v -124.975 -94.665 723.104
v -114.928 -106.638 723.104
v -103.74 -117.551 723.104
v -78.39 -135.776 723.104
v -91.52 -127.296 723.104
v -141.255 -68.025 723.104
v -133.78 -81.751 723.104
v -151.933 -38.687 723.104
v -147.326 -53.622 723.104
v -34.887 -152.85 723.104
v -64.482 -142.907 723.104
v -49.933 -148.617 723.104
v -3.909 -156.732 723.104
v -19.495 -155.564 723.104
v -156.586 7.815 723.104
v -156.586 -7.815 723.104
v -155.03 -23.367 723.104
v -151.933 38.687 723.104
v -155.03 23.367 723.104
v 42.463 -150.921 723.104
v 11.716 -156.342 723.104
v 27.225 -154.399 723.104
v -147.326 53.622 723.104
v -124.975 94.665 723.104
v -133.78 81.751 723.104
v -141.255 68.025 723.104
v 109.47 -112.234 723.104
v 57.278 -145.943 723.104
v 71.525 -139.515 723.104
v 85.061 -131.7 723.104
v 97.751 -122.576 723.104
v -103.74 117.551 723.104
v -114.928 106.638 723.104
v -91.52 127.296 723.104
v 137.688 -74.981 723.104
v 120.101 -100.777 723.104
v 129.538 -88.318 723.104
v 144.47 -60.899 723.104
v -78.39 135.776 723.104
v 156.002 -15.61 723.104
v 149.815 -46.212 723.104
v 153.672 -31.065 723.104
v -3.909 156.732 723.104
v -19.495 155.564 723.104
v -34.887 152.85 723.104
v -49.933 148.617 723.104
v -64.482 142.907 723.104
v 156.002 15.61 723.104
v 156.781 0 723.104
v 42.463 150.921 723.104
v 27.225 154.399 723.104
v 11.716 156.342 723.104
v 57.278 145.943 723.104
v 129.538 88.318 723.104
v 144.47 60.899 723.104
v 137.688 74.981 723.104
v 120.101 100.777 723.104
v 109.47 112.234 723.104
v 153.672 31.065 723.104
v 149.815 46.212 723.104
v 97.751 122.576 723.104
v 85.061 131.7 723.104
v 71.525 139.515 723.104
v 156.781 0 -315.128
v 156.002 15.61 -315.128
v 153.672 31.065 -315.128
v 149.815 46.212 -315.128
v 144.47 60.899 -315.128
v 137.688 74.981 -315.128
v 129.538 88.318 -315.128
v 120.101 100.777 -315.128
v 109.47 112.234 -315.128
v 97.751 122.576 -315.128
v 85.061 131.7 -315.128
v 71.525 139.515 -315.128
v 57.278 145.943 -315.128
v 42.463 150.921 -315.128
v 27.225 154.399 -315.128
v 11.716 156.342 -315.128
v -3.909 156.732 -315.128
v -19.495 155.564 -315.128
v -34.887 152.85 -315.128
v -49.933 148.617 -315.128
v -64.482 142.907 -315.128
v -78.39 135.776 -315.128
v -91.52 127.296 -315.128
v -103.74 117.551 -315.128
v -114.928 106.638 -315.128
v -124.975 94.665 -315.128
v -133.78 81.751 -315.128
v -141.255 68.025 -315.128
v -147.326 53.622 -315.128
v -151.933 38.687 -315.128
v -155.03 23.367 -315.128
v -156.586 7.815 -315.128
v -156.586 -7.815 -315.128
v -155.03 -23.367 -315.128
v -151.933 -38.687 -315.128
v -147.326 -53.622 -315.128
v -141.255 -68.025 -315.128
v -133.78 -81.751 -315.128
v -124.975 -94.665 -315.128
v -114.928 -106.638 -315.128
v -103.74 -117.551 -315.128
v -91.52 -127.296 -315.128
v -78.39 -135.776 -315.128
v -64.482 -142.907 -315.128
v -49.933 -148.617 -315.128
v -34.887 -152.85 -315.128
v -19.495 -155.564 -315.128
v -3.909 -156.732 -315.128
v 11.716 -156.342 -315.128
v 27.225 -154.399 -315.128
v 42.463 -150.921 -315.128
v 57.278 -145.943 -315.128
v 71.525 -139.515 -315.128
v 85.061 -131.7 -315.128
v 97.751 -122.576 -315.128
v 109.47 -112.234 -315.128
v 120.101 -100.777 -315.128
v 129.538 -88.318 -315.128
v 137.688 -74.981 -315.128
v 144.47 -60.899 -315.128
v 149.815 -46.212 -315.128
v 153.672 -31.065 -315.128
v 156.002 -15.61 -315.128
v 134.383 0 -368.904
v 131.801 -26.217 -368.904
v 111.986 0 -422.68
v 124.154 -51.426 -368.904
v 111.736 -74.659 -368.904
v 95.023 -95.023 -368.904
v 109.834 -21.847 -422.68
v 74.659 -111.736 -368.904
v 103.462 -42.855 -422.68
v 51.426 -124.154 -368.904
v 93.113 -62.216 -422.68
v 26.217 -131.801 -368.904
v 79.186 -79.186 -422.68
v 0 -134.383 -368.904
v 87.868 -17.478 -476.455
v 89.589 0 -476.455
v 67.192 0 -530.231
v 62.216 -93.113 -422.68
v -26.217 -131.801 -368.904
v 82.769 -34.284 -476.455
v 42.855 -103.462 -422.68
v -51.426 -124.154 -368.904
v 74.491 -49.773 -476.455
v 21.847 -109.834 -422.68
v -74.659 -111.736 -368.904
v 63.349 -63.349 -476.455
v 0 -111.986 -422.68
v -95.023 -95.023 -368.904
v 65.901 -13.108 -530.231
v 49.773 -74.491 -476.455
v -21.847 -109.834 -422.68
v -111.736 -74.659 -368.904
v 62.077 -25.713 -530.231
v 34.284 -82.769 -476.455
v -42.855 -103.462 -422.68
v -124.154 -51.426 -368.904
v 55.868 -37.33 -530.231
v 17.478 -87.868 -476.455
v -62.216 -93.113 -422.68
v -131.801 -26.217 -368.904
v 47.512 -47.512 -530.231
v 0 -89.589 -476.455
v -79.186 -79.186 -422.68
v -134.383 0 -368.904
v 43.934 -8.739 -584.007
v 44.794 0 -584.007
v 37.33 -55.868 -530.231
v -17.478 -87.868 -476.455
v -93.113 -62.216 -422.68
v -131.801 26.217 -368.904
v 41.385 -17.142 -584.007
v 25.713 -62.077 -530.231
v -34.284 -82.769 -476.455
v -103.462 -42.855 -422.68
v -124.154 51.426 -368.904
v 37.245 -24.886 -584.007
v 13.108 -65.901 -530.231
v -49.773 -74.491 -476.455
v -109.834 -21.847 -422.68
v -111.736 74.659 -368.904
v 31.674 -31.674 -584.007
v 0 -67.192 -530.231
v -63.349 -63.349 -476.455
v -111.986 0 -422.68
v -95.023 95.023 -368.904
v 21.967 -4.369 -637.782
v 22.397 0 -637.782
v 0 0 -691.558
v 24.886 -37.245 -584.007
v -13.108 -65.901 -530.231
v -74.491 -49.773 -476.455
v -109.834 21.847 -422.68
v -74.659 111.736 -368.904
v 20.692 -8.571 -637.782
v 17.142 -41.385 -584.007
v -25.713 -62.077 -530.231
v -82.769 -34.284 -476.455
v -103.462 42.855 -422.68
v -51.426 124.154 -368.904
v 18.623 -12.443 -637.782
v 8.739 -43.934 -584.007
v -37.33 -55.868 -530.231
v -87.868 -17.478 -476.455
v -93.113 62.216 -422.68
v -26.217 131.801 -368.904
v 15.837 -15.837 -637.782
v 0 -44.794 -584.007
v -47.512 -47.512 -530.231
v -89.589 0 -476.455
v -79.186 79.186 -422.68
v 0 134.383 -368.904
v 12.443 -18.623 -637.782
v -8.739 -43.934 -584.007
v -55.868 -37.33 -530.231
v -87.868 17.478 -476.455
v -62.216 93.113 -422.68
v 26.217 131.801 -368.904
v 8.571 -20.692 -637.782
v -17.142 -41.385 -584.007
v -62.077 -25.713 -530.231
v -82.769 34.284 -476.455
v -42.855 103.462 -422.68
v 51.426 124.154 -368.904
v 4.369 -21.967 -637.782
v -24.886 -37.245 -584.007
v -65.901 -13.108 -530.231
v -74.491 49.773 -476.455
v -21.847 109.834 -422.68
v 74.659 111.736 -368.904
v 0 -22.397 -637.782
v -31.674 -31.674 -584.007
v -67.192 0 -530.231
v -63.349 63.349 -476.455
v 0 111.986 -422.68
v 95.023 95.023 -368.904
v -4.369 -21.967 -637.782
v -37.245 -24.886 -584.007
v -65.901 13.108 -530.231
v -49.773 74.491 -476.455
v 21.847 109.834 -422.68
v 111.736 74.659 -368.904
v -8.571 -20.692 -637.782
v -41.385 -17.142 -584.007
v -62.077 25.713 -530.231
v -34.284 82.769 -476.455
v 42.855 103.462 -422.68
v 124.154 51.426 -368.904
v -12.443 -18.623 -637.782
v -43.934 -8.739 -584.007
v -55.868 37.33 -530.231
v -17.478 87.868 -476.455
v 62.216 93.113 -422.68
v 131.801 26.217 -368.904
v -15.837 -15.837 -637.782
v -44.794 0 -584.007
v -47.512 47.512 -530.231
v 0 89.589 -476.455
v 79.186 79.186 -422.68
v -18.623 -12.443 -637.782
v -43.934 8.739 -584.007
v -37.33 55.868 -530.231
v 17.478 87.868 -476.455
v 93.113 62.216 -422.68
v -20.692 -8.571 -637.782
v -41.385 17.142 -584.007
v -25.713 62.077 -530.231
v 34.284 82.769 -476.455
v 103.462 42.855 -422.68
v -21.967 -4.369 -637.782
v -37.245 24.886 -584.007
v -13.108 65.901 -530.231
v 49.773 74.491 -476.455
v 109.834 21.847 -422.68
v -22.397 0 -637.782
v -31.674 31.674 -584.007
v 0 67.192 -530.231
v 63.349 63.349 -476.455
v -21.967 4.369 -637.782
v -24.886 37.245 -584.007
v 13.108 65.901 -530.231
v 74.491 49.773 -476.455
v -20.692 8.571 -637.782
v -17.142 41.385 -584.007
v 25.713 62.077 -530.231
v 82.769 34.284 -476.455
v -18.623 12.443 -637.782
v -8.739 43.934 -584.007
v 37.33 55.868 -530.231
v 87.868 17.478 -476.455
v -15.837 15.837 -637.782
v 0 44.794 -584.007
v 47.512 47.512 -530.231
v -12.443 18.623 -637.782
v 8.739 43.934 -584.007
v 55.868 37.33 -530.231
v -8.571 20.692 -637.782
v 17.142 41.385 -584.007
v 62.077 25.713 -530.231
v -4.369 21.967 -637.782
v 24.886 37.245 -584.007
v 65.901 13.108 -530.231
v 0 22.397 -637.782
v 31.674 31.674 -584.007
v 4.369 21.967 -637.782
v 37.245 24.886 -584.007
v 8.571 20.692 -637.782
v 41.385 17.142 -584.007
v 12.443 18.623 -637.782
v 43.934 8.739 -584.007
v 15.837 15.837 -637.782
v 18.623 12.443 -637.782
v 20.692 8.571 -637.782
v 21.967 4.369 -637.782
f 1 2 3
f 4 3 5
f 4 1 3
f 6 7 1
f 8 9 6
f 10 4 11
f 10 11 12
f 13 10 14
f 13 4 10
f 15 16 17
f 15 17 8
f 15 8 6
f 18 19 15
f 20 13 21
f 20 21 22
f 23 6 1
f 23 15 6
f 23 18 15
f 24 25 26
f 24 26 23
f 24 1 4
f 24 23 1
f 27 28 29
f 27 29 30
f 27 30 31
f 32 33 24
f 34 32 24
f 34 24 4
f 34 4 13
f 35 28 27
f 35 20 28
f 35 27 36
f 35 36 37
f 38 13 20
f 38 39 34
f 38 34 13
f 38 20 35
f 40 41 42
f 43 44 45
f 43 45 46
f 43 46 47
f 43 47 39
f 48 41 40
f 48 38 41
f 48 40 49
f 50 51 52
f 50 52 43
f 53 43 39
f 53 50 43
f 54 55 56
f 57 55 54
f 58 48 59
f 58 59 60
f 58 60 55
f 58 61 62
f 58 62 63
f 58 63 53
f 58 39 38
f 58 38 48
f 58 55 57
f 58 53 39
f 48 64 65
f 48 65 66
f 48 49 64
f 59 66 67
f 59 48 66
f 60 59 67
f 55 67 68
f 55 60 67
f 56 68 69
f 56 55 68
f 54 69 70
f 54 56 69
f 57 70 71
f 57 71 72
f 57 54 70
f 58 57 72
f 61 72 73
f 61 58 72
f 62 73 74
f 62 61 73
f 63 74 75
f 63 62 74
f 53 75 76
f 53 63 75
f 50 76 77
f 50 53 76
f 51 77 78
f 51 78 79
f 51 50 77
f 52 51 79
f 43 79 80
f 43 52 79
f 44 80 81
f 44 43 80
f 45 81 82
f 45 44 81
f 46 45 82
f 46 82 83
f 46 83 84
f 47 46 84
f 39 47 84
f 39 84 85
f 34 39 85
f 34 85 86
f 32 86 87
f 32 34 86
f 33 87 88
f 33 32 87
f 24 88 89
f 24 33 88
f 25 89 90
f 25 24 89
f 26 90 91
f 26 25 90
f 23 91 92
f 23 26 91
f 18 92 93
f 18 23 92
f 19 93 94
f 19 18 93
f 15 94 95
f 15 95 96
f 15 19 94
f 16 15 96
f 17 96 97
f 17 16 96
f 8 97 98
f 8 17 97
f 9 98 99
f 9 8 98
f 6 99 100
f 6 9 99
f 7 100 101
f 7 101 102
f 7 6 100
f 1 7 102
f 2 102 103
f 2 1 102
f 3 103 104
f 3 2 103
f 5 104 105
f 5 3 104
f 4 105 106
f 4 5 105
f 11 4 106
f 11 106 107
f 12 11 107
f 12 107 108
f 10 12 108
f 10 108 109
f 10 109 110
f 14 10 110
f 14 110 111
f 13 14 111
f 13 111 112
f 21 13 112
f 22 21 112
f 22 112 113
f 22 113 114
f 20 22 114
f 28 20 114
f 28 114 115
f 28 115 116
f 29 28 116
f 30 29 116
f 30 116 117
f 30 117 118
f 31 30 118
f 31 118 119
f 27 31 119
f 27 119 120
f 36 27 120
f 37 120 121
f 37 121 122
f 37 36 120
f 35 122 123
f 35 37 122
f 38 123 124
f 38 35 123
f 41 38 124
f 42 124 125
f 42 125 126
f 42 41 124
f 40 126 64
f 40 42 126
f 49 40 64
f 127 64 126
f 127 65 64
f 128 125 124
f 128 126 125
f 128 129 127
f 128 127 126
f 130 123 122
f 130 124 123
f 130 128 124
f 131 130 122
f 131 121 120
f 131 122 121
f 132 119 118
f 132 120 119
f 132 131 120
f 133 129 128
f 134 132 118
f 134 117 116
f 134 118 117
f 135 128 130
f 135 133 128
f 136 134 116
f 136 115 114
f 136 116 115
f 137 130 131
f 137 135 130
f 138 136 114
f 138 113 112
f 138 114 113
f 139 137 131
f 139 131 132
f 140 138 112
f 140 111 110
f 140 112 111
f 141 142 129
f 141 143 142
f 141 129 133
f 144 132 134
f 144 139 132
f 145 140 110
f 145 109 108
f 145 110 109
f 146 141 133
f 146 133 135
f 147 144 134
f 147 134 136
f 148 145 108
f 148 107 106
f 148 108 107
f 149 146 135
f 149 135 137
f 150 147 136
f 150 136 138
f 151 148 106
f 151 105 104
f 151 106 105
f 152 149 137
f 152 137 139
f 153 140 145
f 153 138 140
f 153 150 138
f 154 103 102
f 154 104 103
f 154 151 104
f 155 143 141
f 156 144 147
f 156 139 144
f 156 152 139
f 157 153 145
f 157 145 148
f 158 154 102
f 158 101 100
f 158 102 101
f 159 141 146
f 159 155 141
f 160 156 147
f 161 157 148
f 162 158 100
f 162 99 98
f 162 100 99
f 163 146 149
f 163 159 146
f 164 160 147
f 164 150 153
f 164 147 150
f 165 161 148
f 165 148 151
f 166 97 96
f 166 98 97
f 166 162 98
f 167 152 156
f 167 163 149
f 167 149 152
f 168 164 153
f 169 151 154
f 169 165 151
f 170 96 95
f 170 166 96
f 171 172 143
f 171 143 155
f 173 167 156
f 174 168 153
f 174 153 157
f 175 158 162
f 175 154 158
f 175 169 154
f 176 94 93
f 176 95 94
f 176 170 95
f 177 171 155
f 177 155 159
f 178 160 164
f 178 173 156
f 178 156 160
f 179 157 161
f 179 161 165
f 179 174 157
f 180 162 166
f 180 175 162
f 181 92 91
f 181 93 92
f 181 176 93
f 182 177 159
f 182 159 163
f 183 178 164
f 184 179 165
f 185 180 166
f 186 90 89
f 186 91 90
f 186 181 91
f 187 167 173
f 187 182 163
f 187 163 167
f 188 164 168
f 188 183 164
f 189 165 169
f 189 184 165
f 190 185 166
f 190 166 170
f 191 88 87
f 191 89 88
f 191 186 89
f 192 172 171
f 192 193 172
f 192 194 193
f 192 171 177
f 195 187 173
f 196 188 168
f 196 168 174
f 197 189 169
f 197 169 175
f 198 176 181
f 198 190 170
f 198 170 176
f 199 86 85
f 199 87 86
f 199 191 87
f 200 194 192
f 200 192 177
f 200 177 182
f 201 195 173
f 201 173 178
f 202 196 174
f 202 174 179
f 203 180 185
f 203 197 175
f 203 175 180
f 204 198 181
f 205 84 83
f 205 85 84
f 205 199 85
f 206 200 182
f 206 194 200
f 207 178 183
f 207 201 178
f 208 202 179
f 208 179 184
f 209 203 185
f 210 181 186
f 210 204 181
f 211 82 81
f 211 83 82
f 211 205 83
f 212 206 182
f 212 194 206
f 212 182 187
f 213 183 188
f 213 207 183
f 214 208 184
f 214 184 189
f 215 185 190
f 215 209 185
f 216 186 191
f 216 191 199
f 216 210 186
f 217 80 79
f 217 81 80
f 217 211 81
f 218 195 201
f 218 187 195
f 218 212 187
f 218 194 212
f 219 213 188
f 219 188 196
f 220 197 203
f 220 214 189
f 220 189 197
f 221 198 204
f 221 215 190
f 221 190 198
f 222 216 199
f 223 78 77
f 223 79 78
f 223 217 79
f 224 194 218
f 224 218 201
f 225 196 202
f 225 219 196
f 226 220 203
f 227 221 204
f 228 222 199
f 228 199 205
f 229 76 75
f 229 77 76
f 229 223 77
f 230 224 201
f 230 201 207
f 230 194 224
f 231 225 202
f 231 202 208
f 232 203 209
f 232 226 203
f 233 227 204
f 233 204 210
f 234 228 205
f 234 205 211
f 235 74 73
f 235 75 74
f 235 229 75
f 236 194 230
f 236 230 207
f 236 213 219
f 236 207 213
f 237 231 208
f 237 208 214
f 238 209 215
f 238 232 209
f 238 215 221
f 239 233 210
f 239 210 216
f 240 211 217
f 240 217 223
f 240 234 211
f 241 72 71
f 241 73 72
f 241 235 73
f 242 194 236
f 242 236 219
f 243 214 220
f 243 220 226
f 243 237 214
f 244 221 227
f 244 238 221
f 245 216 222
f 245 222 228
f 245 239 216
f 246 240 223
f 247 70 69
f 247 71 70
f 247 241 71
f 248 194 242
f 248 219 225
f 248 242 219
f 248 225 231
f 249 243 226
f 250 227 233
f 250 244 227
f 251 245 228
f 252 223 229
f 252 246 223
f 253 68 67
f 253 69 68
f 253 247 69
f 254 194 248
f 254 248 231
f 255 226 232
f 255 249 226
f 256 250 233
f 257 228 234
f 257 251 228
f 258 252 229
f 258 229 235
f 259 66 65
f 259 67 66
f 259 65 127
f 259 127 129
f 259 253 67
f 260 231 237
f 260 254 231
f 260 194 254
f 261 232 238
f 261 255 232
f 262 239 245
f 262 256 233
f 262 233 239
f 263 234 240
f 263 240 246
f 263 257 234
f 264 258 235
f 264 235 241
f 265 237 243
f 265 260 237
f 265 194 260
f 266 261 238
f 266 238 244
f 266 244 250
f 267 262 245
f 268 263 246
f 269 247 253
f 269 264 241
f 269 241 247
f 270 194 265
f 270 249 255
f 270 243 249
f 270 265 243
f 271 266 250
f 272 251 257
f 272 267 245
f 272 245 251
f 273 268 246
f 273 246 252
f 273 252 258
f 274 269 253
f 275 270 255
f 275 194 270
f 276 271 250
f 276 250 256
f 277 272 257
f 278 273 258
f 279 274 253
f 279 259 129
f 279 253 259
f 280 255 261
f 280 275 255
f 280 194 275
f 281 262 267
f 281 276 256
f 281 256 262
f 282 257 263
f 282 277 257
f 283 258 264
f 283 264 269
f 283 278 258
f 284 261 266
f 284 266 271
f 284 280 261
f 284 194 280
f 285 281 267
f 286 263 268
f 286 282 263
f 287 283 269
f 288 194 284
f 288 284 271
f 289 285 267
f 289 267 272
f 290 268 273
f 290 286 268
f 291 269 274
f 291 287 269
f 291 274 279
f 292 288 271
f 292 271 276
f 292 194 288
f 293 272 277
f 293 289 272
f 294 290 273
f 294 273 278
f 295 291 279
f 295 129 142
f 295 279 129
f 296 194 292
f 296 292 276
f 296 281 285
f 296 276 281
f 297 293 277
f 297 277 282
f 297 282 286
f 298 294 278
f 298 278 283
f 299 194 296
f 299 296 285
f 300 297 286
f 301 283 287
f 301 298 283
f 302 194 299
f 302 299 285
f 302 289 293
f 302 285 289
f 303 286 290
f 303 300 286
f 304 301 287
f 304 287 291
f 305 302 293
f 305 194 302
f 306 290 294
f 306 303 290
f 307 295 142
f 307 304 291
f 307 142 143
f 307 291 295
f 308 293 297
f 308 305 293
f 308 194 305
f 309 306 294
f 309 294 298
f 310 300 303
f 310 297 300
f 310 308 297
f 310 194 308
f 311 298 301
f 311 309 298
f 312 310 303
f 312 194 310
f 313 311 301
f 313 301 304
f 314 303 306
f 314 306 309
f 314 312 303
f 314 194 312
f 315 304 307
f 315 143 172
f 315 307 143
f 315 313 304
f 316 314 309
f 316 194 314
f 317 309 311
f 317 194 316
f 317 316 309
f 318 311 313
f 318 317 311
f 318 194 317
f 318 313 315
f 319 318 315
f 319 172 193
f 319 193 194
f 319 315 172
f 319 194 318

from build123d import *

# Parameters (mm, degrees)
F0_R      = 156.7807212082
F2_DEPTH  = 723.103761673
F4_DEPTH  = 289.7283732891
F5_DEPTH  = 25.4
F5_FACE_R = 156.7807212082


with BuildPart() as f2:
    # F0 (on Top) → F2 (new body)
    with BuildSketch(Plane.XY):
        Circle(F0_R)
    extrude(amount=F2_DEPTH)

    # F4 (add): a face of the model
    f4_faces = [f2.faces().sort_by_distance(p)[0] for p in [
        (0, 0, 0),
    ]]
    extrude(f4_faces, amount=F4_DEPTH)

    # F5 (add): a face of the model
    f5_faces = [f2.faces().sort_by_distance(p)[0] for p in [
        (0, 0, -289.7283732891),
    ]]
    extrude(f5_faces, amount=F5_DEPTH)

    # F5_face (on face) → F6 section 0
    with BuildSketch(Plane(origin=(0, 0, -315.1283732891), x_dir=(1, 0, 0), z_dir=(0, 0, -1)), mode=Mode.PRIVATE) as f6_s0:
        Circle(F5_FACE_R)
    loft([f6_s0.sketch, Vertex(0, 0, -691.5580034256)])


solid = f2.part
